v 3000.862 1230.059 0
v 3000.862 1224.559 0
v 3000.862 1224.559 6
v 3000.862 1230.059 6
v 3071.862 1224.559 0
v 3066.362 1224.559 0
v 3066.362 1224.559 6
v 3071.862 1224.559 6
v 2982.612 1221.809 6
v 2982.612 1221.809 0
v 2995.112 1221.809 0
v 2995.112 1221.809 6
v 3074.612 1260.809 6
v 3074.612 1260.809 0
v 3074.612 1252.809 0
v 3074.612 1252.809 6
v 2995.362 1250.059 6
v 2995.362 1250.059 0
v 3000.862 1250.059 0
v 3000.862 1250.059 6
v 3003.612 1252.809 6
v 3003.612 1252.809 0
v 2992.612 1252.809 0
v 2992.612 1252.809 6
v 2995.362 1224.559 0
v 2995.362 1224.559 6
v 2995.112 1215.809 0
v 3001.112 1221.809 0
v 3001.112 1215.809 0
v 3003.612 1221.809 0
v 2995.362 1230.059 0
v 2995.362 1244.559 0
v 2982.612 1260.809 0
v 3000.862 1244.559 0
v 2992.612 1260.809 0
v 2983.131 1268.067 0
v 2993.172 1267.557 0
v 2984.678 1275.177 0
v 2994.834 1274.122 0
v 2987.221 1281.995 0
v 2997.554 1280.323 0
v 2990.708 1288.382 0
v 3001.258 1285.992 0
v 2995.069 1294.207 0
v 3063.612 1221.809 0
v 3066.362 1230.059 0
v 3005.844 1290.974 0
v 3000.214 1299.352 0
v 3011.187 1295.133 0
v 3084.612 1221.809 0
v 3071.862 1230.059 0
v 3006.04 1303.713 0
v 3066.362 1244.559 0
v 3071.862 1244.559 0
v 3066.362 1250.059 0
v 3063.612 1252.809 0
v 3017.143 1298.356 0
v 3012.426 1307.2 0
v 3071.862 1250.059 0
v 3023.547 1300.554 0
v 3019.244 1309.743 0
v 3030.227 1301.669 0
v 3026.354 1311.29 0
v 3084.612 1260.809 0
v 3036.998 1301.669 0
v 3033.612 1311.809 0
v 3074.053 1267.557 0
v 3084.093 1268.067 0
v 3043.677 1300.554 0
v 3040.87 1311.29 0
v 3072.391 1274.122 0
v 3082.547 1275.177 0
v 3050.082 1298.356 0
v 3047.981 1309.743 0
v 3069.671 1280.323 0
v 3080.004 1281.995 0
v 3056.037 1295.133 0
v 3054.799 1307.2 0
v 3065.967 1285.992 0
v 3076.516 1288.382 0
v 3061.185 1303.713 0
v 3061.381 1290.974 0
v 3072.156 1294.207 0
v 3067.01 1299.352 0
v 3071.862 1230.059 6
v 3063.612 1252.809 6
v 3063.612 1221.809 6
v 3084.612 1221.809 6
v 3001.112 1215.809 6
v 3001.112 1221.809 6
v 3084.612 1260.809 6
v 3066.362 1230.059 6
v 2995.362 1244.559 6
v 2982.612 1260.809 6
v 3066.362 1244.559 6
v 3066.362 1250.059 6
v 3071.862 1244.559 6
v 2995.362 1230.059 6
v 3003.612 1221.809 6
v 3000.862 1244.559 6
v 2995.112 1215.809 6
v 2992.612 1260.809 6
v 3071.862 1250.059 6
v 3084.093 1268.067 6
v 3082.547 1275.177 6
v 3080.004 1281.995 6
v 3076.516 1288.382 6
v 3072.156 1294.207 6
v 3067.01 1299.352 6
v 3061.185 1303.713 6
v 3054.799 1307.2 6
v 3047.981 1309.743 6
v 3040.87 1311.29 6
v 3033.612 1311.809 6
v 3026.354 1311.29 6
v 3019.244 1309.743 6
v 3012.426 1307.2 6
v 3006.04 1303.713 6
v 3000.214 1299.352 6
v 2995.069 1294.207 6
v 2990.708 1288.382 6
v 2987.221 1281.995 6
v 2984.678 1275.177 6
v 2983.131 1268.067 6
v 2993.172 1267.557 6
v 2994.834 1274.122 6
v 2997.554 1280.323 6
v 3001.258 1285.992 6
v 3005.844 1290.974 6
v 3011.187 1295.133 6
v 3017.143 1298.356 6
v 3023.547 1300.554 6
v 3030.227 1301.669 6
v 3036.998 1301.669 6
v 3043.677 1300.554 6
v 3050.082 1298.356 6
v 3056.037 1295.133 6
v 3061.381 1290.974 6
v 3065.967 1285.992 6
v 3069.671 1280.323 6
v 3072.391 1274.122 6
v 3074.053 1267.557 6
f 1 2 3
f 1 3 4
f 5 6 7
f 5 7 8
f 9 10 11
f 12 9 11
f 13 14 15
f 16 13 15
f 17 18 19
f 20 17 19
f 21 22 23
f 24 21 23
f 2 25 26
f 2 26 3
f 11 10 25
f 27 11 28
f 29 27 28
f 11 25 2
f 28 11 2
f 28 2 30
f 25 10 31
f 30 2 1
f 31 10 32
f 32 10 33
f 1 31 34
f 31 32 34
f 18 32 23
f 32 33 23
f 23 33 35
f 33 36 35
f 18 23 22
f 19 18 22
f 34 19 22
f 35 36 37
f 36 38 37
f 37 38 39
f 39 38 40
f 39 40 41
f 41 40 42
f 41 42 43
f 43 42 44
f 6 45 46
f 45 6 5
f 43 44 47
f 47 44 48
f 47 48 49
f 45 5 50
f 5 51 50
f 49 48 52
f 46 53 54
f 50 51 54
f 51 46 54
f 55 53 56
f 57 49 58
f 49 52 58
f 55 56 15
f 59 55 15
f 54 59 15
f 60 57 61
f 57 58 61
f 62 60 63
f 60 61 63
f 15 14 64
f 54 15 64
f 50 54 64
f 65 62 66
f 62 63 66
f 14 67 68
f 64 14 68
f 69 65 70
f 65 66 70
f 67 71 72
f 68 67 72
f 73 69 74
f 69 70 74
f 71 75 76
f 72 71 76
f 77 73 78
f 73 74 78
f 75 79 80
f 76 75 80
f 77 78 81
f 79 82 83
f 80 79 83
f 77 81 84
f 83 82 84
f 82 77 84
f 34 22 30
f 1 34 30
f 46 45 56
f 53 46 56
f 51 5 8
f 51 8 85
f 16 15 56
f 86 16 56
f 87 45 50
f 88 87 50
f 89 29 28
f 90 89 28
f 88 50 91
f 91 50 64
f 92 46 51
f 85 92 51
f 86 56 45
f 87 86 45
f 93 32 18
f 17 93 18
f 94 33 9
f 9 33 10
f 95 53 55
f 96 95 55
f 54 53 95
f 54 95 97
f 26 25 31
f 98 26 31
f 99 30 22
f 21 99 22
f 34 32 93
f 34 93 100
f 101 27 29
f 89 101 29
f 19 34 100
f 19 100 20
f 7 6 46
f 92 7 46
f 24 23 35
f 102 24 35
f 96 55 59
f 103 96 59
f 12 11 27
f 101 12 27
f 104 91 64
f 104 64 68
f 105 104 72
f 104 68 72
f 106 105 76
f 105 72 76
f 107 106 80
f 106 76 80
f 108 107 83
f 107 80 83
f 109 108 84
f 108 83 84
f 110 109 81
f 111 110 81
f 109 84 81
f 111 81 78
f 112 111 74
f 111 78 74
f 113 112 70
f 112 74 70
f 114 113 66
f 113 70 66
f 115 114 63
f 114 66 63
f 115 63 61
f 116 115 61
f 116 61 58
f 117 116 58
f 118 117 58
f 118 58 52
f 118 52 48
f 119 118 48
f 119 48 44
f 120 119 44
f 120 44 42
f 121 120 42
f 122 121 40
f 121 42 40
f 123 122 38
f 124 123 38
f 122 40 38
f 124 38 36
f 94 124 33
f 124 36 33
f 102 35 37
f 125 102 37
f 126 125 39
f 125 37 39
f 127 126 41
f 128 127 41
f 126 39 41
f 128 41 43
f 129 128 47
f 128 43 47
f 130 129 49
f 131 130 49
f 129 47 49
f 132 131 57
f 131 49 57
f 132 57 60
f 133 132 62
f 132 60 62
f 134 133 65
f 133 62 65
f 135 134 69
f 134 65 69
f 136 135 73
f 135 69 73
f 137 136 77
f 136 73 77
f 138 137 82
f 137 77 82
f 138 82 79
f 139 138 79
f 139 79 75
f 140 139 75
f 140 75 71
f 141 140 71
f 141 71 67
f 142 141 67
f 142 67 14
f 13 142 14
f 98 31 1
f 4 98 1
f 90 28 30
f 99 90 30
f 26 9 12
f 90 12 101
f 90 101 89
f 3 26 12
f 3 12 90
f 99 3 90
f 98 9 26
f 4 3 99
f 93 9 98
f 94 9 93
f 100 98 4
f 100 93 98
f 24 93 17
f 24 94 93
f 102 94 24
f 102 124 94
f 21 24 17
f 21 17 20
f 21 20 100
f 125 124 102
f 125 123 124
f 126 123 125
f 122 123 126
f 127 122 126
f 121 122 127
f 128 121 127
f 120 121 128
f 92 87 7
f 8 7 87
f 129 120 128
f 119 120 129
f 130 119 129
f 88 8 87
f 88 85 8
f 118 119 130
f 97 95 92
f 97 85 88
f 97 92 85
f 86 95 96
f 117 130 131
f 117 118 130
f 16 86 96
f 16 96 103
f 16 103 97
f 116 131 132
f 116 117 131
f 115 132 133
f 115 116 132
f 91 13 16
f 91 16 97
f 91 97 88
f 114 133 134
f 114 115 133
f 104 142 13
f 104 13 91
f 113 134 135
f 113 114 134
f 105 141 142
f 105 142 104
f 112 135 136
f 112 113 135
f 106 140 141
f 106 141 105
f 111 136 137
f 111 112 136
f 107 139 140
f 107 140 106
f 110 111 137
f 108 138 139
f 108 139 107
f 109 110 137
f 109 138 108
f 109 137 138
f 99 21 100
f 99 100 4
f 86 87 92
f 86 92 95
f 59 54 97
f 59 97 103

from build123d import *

# Parameters (mm, degrees)
MODEL_W             = 5.5
MODEL_H             = 5.5
BOSS_EXTRUDE1_DEPTH = 6


with BuildPart() as part:
    # Model → Boss-Extrude1 (new body)
    with BuildSketch(Plane.XY):
        with BuildLine():
            Line((2982.612369189, 1260.808846123), (2982.612369189, 1221.808846123))
            Line((2982.612369189, 1221.808846123), (2995.112369189, 1221.808846123))
            Line((2995.112369189, 1221.808846123), (2995.112369189, 1215.808846123))
            Line((2995.112369189, 1215.808846123), (3001.112369189, 1215.808846123))
            Line((3001.112369189, 1215.808846123), (3001.112369189, 1221.808846123))
            Line((3001.112369189, 1221.808846123), (3003.612369189, 1221.808846123))
            Line((3003.612369189, 1221.808846123), (3003.612369189, 1252.808846123))
            Line((3003.612369189, 1252.808846123), (2992.612369189, 1252.808846123))
            Line((2992.612369189, 1252.808846123), (2992.612369189, 1260.808846123))
            ThreePointArc((2992.612369189, 1260.808846123), (3033.612369189, 1301.808846123), (3074.612369189, 1260.808846123))
            Line((3074.612369189, 1260.808846123), (3074.612369189, 1252.808846123))
            Line((3074.612369189, 1252.808846123), (3063.612369189, 1252.808846123))
            Line((3063.612369189, 1252.808846123), (3063.612369189, 1221.808846123))
            Line((3063.612369189, 1221.808846123), (3074.612369189, 1221.808846123))
            Line((3074.612369189, 1221.808846123), (3084.612369189, 1221.808846123))
            Line((3084.612369189, 1221.808846123), (3084.612369189, 1260.808846123))
            ThreePointArc((3084.612369189, 1260.808846123), (3033.612369189, 1311.808846123), (2982.612369189, 1260.808846123))
        make_face()
        with Locations((3069.112369189, 1227.308846123)):
            Rectangle(MODEL_W, MODEL_H, mode=Mode.SUBTRACT)
        with Locations((3069.112369189, 1247.308846123)):
            Rectangle(MODEL_W, MODEL_H, mode=Mode.SUBTRACT)
        with Locations((2998.112369189, 1227.308846123)):
            Rectangle(MODEL_W, MODEL_H, mode=Mode.SUBTRACT)
        with Locations((2998.112369189, 1247.308846123)):
            Rectangle(MODEL_W, MODEL_H, mode=Mode.SUBTRACT)
    extrude(amount=BOSS_EXTRUDE1_DEPTH)


solid = part.part
